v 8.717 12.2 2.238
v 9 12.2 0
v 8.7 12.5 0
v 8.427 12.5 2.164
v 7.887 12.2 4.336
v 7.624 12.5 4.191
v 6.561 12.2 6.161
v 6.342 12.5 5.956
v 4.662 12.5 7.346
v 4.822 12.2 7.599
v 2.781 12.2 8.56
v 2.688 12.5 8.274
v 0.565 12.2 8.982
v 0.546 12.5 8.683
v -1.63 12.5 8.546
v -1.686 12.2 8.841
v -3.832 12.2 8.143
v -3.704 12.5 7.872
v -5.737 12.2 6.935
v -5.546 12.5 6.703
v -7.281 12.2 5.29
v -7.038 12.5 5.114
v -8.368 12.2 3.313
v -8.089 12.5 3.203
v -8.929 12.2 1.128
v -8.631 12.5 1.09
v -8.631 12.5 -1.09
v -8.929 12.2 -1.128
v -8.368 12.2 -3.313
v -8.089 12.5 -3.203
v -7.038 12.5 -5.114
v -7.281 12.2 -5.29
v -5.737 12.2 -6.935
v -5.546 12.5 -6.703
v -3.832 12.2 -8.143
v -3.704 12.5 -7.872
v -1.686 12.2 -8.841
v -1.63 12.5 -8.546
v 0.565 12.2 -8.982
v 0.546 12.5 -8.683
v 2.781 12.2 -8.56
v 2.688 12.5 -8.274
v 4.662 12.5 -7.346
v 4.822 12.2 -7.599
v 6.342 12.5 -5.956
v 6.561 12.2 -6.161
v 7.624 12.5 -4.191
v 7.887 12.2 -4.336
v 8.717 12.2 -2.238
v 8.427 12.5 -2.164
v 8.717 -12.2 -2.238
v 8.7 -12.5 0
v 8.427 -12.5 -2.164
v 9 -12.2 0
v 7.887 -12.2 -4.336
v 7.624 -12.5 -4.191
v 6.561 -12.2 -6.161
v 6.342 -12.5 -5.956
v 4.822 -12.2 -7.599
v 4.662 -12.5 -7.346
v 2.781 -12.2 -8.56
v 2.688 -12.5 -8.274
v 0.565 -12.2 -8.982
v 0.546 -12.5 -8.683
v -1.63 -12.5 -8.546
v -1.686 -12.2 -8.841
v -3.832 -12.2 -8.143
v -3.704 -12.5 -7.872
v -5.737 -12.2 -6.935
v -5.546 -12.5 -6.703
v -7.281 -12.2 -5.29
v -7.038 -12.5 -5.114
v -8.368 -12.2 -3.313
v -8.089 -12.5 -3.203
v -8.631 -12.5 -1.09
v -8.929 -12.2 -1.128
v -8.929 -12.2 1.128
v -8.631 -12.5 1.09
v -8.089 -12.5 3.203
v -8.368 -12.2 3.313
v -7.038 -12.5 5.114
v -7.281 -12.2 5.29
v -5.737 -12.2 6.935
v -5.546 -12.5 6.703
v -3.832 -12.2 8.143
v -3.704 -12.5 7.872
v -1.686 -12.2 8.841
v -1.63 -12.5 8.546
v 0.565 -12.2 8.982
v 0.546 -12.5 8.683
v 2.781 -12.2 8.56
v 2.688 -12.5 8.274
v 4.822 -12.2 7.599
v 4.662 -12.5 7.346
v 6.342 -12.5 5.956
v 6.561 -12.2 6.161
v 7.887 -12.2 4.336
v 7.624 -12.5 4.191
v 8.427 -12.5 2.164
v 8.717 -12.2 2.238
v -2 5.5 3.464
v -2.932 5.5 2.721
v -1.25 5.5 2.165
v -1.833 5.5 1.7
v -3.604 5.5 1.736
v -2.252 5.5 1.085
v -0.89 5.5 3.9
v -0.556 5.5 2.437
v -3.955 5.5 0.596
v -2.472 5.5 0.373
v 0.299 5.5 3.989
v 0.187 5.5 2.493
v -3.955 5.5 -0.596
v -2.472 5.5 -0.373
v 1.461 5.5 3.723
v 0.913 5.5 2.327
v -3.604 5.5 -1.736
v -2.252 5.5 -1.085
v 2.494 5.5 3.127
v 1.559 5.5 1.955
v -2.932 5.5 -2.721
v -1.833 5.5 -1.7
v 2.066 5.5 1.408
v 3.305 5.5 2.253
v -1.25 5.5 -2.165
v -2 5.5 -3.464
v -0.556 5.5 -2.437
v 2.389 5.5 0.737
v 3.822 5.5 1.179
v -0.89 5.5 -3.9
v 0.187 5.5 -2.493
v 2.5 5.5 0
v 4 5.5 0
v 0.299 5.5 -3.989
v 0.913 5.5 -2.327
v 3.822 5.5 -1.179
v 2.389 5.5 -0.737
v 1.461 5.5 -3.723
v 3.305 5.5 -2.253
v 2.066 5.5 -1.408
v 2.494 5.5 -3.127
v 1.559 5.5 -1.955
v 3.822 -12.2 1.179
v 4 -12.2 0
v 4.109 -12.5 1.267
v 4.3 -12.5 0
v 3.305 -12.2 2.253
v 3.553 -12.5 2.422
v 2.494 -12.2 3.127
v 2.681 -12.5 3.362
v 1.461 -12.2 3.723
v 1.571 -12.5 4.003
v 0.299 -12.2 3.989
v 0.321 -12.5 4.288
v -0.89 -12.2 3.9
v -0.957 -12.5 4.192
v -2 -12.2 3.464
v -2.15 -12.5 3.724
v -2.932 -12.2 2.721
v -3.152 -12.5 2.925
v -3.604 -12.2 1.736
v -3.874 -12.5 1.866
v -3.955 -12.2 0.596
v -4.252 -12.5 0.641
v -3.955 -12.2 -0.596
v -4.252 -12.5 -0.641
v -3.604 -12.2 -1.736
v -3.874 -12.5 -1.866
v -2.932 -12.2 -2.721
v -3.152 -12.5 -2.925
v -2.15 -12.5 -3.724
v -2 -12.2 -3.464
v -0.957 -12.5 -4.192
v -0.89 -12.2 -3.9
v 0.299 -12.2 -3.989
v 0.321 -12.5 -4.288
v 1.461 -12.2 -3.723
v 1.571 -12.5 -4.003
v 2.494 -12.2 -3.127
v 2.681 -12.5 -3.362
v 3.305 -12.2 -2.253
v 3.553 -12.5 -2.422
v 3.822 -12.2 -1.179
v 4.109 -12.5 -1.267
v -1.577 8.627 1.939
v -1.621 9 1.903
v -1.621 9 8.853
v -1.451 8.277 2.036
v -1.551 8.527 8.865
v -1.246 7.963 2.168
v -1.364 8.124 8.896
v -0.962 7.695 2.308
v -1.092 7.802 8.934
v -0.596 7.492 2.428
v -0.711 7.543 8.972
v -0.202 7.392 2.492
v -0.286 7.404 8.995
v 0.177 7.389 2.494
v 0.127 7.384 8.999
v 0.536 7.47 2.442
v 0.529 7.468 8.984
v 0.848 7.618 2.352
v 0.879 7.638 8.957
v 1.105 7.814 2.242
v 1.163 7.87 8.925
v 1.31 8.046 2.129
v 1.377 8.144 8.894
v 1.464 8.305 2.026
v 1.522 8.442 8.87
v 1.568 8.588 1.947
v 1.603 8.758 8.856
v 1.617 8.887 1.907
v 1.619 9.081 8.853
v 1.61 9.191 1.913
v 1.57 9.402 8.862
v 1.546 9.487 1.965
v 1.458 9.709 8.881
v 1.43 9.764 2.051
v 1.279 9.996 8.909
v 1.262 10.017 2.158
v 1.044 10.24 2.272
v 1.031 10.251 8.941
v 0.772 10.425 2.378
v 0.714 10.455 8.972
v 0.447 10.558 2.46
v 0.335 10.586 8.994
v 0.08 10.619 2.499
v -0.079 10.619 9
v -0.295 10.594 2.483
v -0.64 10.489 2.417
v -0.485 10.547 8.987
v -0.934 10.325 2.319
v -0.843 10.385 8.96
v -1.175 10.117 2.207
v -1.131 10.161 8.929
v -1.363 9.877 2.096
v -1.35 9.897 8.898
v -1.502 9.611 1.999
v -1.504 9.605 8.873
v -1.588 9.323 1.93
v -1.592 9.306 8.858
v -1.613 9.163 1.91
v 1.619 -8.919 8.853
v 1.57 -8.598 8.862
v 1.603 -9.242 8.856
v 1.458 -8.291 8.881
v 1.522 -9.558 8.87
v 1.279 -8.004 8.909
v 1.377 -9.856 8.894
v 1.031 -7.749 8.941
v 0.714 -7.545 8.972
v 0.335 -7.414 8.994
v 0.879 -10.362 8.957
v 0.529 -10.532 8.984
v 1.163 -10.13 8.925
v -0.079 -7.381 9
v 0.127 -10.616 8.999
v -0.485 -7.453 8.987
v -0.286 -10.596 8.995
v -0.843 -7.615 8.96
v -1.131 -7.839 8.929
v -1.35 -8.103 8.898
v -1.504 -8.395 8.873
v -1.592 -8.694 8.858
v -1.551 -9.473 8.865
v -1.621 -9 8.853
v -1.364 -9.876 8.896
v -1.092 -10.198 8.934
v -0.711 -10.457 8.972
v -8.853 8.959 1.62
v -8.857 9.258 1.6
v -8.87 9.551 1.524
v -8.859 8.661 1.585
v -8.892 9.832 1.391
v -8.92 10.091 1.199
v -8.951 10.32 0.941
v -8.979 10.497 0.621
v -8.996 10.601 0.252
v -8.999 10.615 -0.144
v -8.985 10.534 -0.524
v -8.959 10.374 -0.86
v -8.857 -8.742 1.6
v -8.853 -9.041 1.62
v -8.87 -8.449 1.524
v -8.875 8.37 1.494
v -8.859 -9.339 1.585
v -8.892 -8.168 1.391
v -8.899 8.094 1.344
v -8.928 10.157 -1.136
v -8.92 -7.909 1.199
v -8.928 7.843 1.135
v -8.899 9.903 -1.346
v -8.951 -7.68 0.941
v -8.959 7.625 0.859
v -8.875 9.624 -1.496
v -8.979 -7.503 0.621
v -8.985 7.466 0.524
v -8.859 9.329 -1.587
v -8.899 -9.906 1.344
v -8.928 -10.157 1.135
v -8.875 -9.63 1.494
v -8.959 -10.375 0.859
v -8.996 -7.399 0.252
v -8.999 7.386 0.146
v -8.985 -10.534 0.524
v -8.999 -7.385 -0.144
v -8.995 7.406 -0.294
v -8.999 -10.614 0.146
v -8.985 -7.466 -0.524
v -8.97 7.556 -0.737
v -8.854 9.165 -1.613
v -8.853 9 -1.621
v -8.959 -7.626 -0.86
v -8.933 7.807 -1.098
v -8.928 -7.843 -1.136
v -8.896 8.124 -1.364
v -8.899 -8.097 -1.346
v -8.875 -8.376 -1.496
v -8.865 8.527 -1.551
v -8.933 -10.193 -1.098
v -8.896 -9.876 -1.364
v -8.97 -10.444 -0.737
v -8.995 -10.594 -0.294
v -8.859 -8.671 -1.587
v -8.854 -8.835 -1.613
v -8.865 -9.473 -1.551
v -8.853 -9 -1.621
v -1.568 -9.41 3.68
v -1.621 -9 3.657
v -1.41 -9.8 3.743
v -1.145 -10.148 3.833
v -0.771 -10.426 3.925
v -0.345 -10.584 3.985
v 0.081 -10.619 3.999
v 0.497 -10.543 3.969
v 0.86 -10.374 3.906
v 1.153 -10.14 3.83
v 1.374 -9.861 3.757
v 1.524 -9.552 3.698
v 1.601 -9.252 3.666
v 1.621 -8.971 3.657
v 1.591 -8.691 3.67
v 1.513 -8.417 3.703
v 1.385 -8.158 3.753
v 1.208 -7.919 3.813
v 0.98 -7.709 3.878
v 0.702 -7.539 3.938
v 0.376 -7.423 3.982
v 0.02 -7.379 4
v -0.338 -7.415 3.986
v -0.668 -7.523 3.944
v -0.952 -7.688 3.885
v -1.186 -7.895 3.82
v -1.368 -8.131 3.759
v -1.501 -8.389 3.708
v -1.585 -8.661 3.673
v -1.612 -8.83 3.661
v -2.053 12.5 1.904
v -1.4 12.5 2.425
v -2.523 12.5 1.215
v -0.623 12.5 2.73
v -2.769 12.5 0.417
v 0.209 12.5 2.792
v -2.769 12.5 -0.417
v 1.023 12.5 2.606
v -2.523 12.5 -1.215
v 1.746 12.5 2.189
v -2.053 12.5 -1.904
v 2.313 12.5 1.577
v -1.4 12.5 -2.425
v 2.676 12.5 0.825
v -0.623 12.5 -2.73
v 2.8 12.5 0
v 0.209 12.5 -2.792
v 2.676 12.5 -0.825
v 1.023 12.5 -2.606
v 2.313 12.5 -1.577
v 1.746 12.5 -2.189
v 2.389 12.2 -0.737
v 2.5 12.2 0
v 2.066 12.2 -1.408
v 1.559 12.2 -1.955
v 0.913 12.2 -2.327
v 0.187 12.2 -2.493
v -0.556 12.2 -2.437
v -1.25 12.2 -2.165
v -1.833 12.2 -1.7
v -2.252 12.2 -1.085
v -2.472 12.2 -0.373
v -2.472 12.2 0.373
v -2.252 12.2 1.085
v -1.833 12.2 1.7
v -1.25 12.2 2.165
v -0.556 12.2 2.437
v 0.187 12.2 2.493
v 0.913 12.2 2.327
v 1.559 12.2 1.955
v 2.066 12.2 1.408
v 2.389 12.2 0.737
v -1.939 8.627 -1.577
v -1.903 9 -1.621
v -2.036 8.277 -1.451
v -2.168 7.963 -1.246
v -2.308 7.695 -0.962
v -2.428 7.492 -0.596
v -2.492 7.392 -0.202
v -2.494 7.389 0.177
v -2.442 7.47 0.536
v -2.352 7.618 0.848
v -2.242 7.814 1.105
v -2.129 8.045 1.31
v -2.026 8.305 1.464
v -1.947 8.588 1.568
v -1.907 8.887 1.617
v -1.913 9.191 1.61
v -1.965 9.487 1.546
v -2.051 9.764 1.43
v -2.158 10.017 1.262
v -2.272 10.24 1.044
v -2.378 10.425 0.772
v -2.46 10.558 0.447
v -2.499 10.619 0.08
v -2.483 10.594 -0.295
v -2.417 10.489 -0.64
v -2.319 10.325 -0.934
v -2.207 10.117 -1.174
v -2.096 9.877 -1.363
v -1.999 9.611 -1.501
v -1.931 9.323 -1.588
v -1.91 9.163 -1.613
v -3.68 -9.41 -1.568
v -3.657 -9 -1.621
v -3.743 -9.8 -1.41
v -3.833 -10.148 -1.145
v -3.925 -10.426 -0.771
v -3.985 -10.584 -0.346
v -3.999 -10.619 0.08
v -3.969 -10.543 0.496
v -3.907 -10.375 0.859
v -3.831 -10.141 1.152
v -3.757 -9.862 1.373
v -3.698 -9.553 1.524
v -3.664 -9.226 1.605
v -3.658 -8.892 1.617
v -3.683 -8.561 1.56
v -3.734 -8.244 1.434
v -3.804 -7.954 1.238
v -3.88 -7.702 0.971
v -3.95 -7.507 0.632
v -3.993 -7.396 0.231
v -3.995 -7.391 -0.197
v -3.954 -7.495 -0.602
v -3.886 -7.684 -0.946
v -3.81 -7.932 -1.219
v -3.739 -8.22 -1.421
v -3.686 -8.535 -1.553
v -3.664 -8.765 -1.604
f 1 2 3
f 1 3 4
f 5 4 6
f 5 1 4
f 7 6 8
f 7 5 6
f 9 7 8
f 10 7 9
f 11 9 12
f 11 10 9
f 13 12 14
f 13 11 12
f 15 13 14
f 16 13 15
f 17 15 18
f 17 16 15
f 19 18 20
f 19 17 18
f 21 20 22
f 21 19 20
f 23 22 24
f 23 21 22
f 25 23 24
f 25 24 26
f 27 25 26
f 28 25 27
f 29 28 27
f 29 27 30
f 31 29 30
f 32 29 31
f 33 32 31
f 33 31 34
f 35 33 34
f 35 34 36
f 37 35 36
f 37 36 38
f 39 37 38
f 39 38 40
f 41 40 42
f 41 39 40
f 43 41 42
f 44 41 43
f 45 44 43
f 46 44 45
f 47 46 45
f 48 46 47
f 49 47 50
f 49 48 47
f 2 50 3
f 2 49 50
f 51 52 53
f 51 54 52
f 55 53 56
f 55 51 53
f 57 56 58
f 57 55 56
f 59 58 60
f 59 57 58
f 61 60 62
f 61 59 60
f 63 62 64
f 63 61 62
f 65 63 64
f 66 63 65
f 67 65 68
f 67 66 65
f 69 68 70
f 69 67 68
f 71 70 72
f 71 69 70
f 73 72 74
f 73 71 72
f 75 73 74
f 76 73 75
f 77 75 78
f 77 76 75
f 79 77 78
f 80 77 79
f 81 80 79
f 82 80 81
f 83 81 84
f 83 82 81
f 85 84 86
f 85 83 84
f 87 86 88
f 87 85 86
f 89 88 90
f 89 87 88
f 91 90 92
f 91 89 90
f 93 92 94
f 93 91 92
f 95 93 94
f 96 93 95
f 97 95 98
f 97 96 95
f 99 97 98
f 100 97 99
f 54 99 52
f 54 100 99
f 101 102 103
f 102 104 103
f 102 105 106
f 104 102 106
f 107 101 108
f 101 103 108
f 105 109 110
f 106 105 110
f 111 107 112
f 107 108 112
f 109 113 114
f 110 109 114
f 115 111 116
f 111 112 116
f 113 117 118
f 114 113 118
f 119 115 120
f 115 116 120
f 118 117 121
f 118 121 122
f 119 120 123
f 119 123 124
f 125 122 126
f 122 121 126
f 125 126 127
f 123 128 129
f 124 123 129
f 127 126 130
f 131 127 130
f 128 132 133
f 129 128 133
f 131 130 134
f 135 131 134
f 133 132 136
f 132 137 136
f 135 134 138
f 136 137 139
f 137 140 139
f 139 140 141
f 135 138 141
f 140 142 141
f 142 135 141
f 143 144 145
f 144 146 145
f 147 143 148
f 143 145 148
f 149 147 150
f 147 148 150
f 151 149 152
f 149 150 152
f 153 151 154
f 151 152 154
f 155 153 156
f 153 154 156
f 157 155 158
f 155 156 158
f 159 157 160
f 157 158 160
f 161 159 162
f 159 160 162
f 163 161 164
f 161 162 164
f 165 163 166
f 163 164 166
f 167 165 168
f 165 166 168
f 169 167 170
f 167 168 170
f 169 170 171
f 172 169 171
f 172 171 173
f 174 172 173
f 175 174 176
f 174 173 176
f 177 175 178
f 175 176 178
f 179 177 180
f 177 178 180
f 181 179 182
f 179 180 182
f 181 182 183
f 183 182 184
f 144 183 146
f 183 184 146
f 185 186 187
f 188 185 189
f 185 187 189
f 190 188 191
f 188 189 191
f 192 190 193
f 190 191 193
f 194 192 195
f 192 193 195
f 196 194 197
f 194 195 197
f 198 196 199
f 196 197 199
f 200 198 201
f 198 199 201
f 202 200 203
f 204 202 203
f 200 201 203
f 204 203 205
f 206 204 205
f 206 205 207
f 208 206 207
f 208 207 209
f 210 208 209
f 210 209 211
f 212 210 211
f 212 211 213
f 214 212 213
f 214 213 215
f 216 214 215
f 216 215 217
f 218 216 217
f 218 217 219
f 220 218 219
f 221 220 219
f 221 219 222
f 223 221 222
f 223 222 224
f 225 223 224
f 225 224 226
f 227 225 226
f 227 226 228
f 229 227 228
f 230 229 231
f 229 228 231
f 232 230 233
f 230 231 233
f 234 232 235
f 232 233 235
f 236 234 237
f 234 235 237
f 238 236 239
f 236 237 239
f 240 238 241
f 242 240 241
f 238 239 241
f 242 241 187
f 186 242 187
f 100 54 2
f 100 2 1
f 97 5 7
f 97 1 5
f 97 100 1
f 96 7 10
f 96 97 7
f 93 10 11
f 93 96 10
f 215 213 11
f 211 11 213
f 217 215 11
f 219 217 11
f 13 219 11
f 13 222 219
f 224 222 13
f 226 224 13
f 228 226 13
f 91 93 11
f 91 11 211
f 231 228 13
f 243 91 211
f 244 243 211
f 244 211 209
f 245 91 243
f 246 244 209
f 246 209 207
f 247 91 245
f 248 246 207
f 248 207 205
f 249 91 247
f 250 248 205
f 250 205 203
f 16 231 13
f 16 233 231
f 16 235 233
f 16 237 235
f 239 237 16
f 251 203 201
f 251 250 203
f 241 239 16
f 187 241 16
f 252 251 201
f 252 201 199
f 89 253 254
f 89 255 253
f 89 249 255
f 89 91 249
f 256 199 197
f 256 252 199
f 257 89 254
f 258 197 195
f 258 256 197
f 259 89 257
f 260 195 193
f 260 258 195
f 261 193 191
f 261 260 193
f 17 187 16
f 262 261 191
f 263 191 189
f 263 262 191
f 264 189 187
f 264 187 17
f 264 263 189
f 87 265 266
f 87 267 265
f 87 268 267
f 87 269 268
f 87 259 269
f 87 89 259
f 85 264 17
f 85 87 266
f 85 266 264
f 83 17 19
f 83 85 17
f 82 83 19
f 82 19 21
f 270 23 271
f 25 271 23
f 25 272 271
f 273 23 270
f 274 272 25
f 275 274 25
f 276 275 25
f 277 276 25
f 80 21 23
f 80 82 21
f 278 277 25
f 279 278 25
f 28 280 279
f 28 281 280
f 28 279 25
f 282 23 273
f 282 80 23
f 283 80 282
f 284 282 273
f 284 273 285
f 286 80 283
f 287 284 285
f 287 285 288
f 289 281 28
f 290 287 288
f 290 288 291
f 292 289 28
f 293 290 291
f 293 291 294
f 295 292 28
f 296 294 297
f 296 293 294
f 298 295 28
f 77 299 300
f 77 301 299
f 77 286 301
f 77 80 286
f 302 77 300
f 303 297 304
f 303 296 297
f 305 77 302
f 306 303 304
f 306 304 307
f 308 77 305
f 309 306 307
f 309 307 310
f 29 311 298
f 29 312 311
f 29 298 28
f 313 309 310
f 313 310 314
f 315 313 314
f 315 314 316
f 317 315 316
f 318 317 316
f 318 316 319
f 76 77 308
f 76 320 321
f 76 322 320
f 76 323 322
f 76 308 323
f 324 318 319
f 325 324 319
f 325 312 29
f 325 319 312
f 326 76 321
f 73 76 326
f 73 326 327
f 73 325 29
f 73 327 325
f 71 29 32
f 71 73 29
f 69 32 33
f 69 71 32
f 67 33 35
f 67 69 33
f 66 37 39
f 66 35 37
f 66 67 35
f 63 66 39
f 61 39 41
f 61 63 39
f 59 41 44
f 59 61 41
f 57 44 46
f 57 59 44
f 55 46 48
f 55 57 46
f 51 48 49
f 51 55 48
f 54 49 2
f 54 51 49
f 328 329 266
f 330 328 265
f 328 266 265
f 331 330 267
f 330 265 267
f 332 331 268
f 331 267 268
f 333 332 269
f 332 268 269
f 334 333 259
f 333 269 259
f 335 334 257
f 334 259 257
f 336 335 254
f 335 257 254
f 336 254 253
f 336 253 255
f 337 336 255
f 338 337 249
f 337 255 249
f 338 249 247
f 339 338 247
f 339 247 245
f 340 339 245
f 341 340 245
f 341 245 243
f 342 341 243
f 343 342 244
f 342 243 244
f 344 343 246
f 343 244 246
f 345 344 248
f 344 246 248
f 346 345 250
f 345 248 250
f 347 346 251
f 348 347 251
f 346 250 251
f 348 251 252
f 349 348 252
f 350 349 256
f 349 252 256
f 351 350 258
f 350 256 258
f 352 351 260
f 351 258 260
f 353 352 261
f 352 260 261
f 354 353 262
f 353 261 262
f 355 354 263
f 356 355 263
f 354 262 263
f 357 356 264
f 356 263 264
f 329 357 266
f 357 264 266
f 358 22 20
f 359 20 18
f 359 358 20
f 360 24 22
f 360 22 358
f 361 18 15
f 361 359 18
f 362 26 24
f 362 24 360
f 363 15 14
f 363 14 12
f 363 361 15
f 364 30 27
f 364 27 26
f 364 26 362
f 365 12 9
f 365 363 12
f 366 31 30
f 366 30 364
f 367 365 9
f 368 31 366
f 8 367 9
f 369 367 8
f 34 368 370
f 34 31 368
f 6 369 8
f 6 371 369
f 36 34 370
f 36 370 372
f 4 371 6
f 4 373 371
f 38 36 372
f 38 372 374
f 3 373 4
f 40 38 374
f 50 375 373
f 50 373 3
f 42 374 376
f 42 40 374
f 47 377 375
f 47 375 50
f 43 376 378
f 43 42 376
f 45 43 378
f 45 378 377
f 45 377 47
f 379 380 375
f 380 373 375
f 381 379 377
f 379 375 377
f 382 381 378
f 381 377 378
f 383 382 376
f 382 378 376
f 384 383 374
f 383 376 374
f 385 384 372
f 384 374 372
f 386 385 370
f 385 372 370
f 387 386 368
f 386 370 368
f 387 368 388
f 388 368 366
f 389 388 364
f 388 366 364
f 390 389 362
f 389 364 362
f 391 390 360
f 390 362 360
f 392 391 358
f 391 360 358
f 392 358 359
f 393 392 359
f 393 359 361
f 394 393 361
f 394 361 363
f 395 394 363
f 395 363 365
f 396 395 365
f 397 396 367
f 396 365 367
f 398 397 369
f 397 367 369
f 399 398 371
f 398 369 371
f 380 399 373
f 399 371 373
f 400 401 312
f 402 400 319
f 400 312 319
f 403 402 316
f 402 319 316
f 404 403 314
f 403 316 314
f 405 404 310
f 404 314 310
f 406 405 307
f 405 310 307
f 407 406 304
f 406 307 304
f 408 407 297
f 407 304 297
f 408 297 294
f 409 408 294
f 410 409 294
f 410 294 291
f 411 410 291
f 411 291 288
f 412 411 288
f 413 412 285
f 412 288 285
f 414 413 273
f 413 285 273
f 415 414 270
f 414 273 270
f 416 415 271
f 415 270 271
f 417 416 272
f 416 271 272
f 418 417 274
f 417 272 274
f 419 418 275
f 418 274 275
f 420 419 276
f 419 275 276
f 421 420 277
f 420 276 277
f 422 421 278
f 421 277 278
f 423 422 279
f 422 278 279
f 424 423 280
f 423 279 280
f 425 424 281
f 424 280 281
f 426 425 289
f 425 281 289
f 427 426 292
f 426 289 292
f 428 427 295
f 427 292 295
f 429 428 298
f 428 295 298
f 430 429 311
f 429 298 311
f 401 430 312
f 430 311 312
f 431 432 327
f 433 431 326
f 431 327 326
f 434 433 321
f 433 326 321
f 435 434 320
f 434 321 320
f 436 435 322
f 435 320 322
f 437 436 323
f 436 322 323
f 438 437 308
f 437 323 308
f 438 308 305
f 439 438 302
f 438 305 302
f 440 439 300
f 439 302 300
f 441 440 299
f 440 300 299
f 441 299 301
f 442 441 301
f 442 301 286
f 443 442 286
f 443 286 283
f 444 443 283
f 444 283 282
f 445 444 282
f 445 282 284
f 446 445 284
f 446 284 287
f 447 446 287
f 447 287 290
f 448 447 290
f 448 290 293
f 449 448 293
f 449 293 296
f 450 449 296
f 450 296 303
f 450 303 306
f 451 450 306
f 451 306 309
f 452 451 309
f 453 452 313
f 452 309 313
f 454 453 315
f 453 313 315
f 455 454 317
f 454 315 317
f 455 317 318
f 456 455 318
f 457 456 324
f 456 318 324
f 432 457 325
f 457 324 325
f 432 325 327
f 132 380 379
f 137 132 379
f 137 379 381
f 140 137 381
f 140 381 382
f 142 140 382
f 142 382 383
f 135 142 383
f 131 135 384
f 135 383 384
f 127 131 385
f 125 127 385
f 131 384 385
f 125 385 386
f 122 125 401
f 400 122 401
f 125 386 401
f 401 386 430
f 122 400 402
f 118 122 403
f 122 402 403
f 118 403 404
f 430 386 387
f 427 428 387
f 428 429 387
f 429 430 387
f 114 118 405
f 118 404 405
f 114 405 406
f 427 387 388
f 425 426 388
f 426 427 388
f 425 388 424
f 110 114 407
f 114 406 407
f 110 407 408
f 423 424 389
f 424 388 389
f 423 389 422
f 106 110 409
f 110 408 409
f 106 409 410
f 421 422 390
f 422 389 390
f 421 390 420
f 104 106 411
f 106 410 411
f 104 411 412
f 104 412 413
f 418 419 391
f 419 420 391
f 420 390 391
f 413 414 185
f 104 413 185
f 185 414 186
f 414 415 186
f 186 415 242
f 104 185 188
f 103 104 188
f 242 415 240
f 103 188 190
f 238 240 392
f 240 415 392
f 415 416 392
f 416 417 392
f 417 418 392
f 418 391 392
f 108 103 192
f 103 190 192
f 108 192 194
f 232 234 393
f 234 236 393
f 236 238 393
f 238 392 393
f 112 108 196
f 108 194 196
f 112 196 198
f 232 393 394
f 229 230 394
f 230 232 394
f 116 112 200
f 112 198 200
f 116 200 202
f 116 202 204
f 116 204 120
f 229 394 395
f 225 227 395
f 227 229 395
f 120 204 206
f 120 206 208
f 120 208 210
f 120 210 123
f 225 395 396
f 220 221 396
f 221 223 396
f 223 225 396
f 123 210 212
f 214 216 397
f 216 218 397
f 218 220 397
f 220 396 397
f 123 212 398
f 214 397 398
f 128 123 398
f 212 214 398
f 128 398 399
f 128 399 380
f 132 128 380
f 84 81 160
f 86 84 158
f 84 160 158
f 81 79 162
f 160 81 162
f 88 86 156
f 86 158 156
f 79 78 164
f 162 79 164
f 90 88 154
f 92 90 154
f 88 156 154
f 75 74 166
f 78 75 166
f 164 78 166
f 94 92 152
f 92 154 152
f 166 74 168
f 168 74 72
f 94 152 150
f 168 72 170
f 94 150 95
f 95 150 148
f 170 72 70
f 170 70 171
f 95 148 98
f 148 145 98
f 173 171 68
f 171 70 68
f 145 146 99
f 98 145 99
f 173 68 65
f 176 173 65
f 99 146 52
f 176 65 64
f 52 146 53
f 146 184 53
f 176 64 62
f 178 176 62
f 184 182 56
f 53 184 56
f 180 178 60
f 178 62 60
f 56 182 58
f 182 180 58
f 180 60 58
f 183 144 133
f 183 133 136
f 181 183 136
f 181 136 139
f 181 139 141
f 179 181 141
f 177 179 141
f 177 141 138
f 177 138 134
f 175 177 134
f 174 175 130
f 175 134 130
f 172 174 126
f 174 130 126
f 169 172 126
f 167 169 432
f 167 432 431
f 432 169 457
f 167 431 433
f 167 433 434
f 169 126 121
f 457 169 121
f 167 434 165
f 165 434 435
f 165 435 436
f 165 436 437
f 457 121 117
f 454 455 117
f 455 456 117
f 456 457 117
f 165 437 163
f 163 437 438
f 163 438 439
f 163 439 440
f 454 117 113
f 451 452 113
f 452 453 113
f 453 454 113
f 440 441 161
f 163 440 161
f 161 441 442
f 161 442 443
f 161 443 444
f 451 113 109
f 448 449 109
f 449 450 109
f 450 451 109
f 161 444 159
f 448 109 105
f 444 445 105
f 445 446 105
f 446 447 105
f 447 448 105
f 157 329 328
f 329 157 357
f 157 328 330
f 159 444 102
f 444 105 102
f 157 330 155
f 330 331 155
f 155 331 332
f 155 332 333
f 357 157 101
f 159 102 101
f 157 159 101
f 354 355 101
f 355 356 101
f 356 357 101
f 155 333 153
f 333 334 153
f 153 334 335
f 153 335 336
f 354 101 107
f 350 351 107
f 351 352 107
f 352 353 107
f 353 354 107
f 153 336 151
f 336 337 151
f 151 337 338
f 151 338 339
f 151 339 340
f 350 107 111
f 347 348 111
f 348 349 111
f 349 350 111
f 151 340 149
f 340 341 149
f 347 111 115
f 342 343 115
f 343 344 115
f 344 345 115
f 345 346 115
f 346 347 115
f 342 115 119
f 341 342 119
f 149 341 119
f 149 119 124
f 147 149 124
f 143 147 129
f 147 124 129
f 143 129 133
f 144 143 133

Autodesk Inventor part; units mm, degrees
ref_plane "YZ Plane" through (0, 0, 0) normal (1, 0, 0) x (0, 1, 0)
ref_plane "XZ Plane" through (0, 0, 0) normal (0, 1, 0) x (-1, 0, 0)
ref_plane "XY Plane" through (0, 0, 0) normal (0, 0, 1) x (1, 0, 0)
sketch "Sketch1" plane through (0, 0, 0) normal (0, 0, 1) x (1, 0, 0)
  line L0 (0, -12.5) -> (0, 12.5)
  line L1 (9, 12.5) -> (9, -12.5)
  line L2 (9, -12.5) -> (4, -12.5)
  line L3 (4, -12.5) -> (4, 5.5)
  line L4 (4, 5.5) -> (2.5, 5.5)
  line L5 (2.5, 5.5) -> (2.5, 12.5)
  line L6 (2.5, 12.5) -> (9, 12.5)
  point P0 (0, 0)
  point P1 (0, 0)
  dimension "d0" = 18
  dimension "d1" = 25
  dimension "d2" = 8
  dimension "d3" = 5
  dimension "d4" = 18
revolve "Revolution1" add sketch "Sketch1" angle 360 about axis through (0, -12.5, 0) along (0, 1, 0)
sketch "Sketch2" plane through (0, 0, 0) normal (1, 0, 0) x (0, 1, 0)
  line L0 (12.5, -2.5) -> (12.5, 2.5) projected
  line L1 (-12.5, -4) -> (-12.5, 4) projected
  point P0 (0, 0)
  point P1 (9, 0)
  point P2 (-9, 0)
  dimension "d6" = 3.5
  dimension "d7" = 3.5
hole "Hole1" at (0, 9, 0) at (0, -9, 0) direction (-1, 0, 0) diameter 3.242 end through all thread size "M4x0.7" class "6H" standard "ANSI Metric M Profile"
chamfer "Chamfer1" distance 0.3 angle 45 4 edges at (-9, 12.5, 0) (-2.5, 12.5, 0) (-9, -12.5, 0) (-4, -12.5, 0)
pattern_circular "Circular Pattern1" count 2 over 90 about axis through (0, 0, 0) along (0, 1, 0) of "Hole1"
properties part number "spring-shaft-coupler" material "Aluminum 6061-AHC"
